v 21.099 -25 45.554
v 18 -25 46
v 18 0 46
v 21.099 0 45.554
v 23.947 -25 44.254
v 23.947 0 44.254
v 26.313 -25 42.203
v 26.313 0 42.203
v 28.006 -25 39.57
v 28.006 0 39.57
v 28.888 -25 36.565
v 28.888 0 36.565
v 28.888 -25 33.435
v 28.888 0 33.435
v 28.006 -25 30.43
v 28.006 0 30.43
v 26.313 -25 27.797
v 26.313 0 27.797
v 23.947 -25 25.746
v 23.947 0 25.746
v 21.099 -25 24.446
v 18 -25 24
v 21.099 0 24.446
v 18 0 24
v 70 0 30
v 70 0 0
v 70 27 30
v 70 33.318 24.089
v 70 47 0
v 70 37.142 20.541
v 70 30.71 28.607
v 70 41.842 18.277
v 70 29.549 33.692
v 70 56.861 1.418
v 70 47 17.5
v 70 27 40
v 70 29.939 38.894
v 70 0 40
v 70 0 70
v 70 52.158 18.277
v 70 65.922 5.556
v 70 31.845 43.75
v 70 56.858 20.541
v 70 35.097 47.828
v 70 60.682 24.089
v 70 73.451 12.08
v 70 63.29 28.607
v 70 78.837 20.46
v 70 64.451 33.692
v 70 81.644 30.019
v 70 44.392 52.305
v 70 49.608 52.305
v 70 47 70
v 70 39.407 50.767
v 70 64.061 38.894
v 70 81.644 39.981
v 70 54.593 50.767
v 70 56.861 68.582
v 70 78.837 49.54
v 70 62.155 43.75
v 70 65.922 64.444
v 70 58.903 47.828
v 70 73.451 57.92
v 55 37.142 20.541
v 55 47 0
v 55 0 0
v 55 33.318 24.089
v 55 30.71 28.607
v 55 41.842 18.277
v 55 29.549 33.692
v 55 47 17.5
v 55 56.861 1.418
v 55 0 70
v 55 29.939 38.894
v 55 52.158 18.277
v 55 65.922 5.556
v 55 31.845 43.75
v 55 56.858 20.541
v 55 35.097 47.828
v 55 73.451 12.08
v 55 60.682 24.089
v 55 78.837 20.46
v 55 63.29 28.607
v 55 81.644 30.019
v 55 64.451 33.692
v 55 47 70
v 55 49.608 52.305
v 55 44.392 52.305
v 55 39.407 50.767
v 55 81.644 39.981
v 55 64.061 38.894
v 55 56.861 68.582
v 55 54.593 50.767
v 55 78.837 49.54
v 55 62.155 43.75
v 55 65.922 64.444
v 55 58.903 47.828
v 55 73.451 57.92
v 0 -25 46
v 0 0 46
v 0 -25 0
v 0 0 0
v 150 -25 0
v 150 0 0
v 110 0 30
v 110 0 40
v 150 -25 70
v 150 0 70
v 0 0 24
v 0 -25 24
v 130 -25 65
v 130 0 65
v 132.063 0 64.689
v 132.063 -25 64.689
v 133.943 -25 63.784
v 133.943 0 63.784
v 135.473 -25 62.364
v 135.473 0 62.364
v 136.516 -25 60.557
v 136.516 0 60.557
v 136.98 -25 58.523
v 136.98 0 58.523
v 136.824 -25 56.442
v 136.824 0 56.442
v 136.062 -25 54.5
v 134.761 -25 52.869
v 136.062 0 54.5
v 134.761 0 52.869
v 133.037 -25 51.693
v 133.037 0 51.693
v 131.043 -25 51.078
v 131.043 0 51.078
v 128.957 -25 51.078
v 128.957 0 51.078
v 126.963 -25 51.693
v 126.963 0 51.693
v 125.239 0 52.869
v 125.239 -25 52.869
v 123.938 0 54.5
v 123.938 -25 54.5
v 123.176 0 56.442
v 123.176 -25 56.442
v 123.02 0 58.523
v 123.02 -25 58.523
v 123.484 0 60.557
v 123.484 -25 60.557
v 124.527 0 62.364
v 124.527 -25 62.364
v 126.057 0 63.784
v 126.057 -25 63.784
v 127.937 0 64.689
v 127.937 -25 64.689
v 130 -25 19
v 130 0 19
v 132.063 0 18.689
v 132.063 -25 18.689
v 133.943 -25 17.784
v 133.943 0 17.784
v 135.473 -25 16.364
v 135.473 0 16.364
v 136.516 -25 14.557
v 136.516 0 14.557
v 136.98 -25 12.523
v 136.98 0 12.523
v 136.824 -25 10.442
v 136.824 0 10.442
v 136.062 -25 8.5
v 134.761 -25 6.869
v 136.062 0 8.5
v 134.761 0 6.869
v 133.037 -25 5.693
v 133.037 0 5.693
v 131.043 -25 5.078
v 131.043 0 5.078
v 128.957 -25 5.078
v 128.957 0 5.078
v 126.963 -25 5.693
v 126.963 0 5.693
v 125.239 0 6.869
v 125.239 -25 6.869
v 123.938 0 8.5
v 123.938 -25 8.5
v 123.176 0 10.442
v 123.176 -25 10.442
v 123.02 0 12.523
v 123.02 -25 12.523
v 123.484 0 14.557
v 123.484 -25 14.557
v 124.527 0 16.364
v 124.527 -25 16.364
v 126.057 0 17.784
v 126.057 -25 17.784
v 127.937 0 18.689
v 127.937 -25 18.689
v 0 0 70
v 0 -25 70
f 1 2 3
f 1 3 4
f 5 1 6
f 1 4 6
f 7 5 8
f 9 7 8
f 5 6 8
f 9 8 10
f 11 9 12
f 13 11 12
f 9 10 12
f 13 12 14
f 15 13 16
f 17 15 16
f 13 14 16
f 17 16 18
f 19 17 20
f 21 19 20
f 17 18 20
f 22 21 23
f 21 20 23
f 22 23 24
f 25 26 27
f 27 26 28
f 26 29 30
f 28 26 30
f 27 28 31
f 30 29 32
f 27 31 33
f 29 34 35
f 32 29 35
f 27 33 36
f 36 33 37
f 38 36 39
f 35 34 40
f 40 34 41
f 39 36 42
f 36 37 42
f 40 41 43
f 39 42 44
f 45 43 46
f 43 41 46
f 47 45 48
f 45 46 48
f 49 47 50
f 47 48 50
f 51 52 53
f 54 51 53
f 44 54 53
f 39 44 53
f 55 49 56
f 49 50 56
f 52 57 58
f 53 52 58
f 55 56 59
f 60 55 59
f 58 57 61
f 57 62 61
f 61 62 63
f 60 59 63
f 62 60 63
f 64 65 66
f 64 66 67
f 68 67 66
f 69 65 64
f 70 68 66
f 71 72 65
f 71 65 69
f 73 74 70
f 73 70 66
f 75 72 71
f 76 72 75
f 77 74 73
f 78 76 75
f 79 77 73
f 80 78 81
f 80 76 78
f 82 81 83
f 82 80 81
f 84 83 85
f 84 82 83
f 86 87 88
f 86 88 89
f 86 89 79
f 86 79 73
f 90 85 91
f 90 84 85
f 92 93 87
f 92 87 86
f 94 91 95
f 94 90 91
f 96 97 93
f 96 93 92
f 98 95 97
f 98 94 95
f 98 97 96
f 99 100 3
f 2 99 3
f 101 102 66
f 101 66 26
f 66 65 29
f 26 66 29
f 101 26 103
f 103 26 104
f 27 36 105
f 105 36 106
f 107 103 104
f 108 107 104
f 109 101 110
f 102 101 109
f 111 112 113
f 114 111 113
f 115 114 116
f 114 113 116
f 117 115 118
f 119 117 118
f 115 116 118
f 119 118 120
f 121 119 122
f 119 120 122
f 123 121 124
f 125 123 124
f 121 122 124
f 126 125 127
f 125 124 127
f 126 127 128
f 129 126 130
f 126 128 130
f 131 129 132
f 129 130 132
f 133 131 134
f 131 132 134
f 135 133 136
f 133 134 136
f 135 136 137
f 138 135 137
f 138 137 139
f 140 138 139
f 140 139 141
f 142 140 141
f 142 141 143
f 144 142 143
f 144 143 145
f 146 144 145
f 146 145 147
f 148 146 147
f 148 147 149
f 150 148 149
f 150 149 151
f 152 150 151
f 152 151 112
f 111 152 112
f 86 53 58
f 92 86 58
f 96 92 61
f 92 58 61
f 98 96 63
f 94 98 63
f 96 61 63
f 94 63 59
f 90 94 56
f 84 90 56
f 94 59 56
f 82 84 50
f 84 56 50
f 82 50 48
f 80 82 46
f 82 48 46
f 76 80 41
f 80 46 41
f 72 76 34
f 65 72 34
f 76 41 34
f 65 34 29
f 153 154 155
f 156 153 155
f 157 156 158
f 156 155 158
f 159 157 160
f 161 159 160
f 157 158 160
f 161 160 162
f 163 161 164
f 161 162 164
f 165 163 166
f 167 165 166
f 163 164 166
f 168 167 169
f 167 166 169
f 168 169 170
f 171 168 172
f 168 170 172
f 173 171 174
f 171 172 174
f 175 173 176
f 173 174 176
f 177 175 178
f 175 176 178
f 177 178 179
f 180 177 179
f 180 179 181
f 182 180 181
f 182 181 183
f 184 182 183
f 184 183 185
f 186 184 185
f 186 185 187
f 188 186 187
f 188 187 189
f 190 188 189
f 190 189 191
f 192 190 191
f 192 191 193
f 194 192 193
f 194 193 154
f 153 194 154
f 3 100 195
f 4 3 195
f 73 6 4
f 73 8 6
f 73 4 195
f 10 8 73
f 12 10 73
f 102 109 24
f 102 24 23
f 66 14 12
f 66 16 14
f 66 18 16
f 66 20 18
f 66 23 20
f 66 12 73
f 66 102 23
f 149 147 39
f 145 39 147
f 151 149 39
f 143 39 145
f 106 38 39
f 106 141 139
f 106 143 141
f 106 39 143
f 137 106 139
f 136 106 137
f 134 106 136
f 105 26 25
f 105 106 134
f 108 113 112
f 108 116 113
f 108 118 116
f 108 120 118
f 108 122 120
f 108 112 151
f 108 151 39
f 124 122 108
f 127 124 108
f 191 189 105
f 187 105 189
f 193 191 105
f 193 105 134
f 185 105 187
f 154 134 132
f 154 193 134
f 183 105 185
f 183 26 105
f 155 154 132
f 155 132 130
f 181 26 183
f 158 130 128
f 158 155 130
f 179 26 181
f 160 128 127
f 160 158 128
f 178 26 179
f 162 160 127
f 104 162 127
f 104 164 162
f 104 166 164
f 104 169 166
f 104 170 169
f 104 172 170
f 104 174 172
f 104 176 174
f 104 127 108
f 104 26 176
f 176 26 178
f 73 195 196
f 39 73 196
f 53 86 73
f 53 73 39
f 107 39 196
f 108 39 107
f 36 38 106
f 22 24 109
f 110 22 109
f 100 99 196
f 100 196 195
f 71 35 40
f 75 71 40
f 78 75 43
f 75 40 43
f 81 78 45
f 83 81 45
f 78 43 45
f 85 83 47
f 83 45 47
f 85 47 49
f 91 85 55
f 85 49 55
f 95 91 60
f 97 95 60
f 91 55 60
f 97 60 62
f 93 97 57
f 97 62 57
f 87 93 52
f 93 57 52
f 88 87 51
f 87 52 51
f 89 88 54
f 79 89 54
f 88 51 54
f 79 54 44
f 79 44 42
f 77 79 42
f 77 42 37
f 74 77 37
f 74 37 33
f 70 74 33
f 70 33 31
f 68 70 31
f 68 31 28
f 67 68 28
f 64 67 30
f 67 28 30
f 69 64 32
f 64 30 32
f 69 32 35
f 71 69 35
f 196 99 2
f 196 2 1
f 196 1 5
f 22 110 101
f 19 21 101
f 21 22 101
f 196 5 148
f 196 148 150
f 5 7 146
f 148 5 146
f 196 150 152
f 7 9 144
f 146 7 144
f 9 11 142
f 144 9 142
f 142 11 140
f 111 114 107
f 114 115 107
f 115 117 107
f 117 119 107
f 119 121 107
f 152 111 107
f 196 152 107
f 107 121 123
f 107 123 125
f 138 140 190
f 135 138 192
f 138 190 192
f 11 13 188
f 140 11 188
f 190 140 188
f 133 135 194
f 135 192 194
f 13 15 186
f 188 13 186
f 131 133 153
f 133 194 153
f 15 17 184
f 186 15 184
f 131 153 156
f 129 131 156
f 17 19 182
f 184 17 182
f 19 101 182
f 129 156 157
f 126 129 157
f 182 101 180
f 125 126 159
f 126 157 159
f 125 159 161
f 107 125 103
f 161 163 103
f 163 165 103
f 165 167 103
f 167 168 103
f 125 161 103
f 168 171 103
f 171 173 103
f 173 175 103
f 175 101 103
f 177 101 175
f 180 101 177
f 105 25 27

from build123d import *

# Parameters (mm, degrees)
SKETCH_1_W           = 150
SKETCH_1_H           = 25
EXTRUDE_1_DEPTH      = 70
SKETCH_2_R           = 7
CUT_EXTRUDE_1_DEPTH  = 168.406690428
EXTRUDE_START        = -80
SKETCH_3_R           = 17.5
EXTRUDE_2_DEPTH      = 15
EXTRUDE_5_DEPTH      = 5
EXTRUDE_5_DEPTH_BACK = 5


with BuildPart() as part:
    # Эскиз1 → Бобышка-Вытянуть1 (new body)
    with BuildSketch(Plane.XY):
        with Locations((75, -12.5)):
            Rectangle(SKETCH_1_W, SKETCH_1_H)
    extrude(amount=EXTRUDE_1_DEPTH)

    # Эскиз2 → Вырез-Вытянуть1 (cut, through all)
    with BuildSketch(Plane(origin=(0, 0, 0), x_dir=(1, 0, 0), z_dir=(0, 1, 0))):
        with BuildLine():
            Line((18, -24), (0, -24))
            Line((0, -24), (0, -46))
            Line((0, -46), (18, -46))
            ThreePointArc((18, -46), (29, -35), (18, -24))
        make_face()
        with Locations(Location((130, -12, 0), (0, 0, 270))):
            Circle(SKETCH_2_R)
        with Locations(Location((130, -58, 0), (0, 0, 270))):
            Circle(SKETCH_2_R)
    extrude(amount=-CUT_EXTRUDE_1_DEPTH, mode=Mode.SUBTRACT)

    # Эскиз3 → Бобышка-Вытянуть2 (add)
    with BuildSketch(Plane(origin=(150, 0, 0), x_dir=(0, 0, -1), z_dir=(1, 0, 0)).offset(EXTRUDE_START)):
        with BuildLine():
            Line((-70, 0), (-70, 47))
            ThreePointArc((-70, 47), (-35, 82), (0, 47))
            Line((0, 47), (0, 0))
            Line((0, 0), (-70, 0))
        make_face()
        with Locations((-35, 47)):
            Circle(SKETCH_3_R, mode=Mode.SUBTRACT)
    extrude(amount=-EXTRUDE_2_DEPTH)

    # Sketch 1 2 → Бобышка-Вытянуть5 (add, two sides: drawn at the far end of the back side and taken through both)
    with BuildSketch(Plane(origin=(70, 27, 35), x_dir=(0.8288486740756482, -0.5594728550010625, 0), z_dir=(0, 0, -1)).offset(-EXTRUDE_5_DEPTH_BACK)):
        Polygon((0, 0), (48.259714048, 0), (15.105767085, 22.3789142), align=None)
    extrude(amount=EXTRUDE_5_DEPTH + EXTRUDE_5_DEPTH_BACK)


solid = part.part
